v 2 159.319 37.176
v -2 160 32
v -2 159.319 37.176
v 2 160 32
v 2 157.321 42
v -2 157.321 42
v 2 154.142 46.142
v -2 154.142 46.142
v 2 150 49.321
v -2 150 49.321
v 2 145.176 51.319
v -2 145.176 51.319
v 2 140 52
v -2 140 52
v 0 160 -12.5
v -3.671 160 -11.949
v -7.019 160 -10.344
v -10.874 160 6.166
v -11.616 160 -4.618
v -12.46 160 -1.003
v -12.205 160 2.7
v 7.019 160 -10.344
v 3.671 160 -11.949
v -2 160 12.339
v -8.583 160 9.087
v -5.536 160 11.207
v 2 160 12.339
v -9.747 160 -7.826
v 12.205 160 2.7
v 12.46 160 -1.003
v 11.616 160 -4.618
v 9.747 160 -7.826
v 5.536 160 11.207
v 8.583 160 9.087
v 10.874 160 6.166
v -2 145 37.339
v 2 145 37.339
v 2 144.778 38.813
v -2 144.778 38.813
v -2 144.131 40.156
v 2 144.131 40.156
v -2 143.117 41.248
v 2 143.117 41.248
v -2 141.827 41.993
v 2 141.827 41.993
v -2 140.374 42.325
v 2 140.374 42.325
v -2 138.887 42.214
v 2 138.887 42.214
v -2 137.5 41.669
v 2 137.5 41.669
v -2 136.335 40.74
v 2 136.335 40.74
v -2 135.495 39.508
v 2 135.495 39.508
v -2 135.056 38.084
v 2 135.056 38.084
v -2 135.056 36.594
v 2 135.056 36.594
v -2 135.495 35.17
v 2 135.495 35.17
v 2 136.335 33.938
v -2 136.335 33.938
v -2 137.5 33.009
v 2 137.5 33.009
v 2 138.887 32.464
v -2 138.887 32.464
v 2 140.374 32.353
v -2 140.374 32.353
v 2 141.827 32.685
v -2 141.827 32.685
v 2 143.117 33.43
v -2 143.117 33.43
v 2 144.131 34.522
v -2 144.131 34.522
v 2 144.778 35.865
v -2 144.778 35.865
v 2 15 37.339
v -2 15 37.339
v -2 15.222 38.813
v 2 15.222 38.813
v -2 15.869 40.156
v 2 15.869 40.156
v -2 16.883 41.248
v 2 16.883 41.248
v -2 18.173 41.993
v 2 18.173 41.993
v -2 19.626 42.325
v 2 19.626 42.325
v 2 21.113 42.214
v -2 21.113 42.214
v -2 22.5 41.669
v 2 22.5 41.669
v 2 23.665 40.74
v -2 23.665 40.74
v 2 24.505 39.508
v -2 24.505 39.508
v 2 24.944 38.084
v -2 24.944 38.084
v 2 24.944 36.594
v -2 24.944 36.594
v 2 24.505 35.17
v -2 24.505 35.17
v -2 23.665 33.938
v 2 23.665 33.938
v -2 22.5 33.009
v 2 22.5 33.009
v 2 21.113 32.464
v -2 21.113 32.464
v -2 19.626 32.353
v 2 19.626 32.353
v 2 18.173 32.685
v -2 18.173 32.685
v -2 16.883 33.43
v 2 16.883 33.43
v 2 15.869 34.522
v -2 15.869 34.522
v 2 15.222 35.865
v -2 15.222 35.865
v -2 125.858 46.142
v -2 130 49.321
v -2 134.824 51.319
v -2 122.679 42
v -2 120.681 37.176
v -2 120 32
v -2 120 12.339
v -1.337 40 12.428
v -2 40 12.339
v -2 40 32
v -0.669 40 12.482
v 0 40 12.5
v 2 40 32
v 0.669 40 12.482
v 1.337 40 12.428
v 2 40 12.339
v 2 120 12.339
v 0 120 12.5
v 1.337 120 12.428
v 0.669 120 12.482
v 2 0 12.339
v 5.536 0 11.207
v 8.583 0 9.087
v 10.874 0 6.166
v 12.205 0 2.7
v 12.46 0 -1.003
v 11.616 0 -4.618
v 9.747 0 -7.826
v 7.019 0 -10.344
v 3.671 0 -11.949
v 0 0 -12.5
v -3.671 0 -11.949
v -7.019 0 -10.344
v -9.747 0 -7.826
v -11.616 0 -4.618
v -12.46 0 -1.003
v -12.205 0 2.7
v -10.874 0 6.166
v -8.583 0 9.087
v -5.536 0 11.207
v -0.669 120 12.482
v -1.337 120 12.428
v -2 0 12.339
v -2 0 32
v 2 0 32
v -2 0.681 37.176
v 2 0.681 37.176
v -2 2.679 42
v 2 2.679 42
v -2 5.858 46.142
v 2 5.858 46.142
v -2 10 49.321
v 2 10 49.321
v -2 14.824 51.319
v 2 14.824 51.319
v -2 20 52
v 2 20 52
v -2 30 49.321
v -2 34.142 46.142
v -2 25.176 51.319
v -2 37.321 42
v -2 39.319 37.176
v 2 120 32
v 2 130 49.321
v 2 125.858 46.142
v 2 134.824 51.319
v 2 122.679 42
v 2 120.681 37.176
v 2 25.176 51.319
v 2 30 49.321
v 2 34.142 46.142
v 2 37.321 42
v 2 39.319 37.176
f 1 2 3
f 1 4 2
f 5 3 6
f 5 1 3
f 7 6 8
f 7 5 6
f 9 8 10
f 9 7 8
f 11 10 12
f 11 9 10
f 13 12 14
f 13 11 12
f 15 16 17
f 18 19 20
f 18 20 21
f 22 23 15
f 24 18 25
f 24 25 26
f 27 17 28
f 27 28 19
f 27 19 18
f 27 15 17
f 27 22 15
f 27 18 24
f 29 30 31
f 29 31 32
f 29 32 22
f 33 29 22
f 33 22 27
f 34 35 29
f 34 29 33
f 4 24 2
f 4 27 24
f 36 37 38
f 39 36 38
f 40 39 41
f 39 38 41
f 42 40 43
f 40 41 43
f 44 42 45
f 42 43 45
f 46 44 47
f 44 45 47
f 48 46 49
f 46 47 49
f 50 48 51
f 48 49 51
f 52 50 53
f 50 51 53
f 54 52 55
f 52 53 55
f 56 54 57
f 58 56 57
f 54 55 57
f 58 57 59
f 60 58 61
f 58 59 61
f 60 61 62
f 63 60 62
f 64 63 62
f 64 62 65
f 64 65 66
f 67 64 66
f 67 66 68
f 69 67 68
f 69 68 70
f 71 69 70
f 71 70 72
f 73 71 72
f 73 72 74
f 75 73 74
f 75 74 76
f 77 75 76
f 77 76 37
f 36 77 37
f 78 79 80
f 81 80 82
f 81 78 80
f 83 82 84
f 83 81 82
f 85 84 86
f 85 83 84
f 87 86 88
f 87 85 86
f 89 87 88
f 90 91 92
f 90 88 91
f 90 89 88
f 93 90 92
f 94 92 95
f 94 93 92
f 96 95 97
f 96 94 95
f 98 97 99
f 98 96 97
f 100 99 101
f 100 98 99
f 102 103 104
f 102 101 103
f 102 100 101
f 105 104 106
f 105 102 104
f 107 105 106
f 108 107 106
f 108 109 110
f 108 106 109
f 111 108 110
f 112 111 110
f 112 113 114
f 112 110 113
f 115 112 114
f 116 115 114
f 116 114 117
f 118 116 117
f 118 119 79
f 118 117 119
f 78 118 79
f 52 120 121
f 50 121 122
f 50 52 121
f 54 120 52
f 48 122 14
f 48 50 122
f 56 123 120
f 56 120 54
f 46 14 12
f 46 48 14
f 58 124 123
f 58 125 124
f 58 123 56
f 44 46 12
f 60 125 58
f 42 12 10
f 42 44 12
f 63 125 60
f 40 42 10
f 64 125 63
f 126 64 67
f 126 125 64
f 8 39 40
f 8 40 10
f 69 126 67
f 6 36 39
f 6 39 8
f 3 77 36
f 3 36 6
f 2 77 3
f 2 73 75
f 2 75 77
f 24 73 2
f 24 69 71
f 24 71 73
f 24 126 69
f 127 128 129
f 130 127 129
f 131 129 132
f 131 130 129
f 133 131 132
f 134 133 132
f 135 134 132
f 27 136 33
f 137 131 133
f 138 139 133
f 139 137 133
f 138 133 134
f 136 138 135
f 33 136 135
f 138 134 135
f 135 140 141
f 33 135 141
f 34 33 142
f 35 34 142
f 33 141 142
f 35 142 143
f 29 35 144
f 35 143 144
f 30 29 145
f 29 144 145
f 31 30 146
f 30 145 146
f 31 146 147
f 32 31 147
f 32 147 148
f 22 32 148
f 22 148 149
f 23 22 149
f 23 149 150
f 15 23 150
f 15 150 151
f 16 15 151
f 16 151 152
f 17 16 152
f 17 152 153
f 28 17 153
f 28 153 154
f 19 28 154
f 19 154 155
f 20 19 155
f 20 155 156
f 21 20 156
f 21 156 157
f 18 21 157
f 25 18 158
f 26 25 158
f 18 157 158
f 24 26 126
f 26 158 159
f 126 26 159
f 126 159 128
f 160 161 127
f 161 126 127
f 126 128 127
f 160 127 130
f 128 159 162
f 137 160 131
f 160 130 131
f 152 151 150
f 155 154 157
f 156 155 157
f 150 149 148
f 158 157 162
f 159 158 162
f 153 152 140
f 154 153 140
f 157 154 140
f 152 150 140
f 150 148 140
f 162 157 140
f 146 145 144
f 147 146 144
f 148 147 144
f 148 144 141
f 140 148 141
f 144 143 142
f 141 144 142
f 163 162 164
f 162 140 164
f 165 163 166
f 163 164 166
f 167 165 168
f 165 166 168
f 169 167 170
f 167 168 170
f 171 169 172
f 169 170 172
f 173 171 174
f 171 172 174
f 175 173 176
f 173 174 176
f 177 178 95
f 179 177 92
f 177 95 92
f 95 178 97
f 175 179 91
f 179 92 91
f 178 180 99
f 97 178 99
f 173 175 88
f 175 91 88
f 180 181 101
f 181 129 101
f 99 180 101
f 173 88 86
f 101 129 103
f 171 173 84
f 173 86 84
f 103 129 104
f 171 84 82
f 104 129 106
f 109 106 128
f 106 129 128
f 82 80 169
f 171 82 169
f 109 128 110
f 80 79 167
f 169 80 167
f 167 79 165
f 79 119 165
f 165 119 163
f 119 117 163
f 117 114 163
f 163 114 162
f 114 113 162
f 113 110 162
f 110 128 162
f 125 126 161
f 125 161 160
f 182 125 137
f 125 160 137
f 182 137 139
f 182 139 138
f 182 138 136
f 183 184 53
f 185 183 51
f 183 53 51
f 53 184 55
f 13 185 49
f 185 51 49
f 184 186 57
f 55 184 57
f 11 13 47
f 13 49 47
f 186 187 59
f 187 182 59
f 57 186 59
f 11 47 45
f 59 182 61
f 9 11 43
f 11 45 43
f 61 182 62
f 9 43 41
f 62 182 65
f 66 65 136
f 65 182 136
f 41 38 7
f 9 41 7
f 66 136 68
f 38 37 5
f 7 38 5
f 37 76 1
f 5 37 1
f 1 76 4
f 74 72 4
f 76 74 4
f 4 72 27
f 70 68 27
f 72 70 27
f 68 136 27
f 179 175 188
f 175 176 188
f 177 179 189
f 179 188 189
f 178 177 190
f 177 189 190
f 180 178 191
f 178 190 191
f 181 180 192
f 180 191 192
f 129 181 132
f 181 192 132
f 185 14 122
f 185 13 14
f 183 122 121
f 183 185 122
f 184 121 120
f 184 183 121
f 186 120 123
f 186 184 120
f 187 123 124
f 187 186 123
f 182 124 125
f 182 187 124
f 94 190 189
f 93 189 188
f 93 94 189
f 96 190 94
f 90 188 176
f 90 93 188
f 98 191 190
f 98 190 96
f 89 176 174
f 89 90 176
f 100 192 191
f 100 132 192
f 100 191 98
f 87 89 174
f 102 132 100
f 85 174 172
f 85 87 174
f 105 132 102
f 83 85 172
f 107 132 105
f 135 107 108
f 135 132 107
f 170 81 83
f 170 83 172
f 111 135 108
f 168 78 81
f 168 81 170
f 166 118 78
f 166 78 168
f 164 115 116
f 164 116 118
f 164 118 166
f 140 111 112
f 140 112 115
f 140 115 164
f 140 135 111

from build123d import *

# Parameters (mm, degrees)
SKETCH1_R            = 12.5
BOSS_EXTRUDE1_DEPTH  = 160
SKETCH2_W            = 4
SKETCH2_H            = 40
BOSS_EXTRUDE2_DEPTH  = 40
FILLET1_R            = 20
SKETCH3_R            = 5
CUT_EXTRUDE1_DEPTH   = 169.861629745
FILLET1_OF_MIRROR2_R = 20


with BuildPart() as part:
    # Sketch1 → Boss-Extrude1 (new body)
    with BuildSketch(Plane(origin=(0, 0, 0), x_dir=(1, 0, 0), z_dir=(0, 1, 0))):
        with Locations(Location((0, 0, 0), (0, 0, 270))):
            Circle(SKETCH1_R)
    extrude(amount=BOSS_EXTRUDE1_DEPTH)

    # Sketch2 → Boss-Extrude2 (add)
    with BuildSketch(Plane.XY.offset(12)):
        with Locations((0, 140)):
            Rectangle(SKETCH2_W, SKETCH2_H)
    boss_extrude2 = extrude(amount=BOSS_EXTRUDE2_DEPTH)

    # Fillet1
    fillet1_edges = [part.edges().sort_by_distance(p)[0] for p in [
        (0, 120, 52),
        (0, 160, 52),
    ]]
    fillet(fillet1_edges, radius=FILLET1_R - 0.0001)  # a hair under: the kernel refuses the full size

    # Sketch3 → Cut-Extrude1 (cut, through all)
    with BuildSketch(Plane(origin=(2, 0, 0), x_dir=(0, 0, -1), z_dir=(1, 0, 0))):
        with Locations(Location((-37.338962679, 140, 0), (0, 0, 90))):
            Circle(SKETCH3_R)
    cut_extrude1 = extrude(amount=-CUT_EXTRUDE1_DEPTH, mode=Mode.SUBTRACT)

    # Mirror2: Boss-Extrude2, Cut-Extrude1 across plane
    add(boss_extrude2.mirror(Plane.ZX.offset(80)))
    add(cut_extrude1.mirror(Plane.ZX.offset(80)), mode=Mode.SUBTRACT)

    # Fillet1 of Mirror2
    fillet1_of_mirror2_edges = [part.edges().sort_by_distance(p)[0] for p in [
        (0, 40, 52),
        (0, 0, 52),
    ]]
    fillet(fillet1_of_mirror2_edges, radius=FILLET1_OF_MIRROR2_R - 0.0001)  # a hair under: the kernel refuses the full size


solid = part.part
